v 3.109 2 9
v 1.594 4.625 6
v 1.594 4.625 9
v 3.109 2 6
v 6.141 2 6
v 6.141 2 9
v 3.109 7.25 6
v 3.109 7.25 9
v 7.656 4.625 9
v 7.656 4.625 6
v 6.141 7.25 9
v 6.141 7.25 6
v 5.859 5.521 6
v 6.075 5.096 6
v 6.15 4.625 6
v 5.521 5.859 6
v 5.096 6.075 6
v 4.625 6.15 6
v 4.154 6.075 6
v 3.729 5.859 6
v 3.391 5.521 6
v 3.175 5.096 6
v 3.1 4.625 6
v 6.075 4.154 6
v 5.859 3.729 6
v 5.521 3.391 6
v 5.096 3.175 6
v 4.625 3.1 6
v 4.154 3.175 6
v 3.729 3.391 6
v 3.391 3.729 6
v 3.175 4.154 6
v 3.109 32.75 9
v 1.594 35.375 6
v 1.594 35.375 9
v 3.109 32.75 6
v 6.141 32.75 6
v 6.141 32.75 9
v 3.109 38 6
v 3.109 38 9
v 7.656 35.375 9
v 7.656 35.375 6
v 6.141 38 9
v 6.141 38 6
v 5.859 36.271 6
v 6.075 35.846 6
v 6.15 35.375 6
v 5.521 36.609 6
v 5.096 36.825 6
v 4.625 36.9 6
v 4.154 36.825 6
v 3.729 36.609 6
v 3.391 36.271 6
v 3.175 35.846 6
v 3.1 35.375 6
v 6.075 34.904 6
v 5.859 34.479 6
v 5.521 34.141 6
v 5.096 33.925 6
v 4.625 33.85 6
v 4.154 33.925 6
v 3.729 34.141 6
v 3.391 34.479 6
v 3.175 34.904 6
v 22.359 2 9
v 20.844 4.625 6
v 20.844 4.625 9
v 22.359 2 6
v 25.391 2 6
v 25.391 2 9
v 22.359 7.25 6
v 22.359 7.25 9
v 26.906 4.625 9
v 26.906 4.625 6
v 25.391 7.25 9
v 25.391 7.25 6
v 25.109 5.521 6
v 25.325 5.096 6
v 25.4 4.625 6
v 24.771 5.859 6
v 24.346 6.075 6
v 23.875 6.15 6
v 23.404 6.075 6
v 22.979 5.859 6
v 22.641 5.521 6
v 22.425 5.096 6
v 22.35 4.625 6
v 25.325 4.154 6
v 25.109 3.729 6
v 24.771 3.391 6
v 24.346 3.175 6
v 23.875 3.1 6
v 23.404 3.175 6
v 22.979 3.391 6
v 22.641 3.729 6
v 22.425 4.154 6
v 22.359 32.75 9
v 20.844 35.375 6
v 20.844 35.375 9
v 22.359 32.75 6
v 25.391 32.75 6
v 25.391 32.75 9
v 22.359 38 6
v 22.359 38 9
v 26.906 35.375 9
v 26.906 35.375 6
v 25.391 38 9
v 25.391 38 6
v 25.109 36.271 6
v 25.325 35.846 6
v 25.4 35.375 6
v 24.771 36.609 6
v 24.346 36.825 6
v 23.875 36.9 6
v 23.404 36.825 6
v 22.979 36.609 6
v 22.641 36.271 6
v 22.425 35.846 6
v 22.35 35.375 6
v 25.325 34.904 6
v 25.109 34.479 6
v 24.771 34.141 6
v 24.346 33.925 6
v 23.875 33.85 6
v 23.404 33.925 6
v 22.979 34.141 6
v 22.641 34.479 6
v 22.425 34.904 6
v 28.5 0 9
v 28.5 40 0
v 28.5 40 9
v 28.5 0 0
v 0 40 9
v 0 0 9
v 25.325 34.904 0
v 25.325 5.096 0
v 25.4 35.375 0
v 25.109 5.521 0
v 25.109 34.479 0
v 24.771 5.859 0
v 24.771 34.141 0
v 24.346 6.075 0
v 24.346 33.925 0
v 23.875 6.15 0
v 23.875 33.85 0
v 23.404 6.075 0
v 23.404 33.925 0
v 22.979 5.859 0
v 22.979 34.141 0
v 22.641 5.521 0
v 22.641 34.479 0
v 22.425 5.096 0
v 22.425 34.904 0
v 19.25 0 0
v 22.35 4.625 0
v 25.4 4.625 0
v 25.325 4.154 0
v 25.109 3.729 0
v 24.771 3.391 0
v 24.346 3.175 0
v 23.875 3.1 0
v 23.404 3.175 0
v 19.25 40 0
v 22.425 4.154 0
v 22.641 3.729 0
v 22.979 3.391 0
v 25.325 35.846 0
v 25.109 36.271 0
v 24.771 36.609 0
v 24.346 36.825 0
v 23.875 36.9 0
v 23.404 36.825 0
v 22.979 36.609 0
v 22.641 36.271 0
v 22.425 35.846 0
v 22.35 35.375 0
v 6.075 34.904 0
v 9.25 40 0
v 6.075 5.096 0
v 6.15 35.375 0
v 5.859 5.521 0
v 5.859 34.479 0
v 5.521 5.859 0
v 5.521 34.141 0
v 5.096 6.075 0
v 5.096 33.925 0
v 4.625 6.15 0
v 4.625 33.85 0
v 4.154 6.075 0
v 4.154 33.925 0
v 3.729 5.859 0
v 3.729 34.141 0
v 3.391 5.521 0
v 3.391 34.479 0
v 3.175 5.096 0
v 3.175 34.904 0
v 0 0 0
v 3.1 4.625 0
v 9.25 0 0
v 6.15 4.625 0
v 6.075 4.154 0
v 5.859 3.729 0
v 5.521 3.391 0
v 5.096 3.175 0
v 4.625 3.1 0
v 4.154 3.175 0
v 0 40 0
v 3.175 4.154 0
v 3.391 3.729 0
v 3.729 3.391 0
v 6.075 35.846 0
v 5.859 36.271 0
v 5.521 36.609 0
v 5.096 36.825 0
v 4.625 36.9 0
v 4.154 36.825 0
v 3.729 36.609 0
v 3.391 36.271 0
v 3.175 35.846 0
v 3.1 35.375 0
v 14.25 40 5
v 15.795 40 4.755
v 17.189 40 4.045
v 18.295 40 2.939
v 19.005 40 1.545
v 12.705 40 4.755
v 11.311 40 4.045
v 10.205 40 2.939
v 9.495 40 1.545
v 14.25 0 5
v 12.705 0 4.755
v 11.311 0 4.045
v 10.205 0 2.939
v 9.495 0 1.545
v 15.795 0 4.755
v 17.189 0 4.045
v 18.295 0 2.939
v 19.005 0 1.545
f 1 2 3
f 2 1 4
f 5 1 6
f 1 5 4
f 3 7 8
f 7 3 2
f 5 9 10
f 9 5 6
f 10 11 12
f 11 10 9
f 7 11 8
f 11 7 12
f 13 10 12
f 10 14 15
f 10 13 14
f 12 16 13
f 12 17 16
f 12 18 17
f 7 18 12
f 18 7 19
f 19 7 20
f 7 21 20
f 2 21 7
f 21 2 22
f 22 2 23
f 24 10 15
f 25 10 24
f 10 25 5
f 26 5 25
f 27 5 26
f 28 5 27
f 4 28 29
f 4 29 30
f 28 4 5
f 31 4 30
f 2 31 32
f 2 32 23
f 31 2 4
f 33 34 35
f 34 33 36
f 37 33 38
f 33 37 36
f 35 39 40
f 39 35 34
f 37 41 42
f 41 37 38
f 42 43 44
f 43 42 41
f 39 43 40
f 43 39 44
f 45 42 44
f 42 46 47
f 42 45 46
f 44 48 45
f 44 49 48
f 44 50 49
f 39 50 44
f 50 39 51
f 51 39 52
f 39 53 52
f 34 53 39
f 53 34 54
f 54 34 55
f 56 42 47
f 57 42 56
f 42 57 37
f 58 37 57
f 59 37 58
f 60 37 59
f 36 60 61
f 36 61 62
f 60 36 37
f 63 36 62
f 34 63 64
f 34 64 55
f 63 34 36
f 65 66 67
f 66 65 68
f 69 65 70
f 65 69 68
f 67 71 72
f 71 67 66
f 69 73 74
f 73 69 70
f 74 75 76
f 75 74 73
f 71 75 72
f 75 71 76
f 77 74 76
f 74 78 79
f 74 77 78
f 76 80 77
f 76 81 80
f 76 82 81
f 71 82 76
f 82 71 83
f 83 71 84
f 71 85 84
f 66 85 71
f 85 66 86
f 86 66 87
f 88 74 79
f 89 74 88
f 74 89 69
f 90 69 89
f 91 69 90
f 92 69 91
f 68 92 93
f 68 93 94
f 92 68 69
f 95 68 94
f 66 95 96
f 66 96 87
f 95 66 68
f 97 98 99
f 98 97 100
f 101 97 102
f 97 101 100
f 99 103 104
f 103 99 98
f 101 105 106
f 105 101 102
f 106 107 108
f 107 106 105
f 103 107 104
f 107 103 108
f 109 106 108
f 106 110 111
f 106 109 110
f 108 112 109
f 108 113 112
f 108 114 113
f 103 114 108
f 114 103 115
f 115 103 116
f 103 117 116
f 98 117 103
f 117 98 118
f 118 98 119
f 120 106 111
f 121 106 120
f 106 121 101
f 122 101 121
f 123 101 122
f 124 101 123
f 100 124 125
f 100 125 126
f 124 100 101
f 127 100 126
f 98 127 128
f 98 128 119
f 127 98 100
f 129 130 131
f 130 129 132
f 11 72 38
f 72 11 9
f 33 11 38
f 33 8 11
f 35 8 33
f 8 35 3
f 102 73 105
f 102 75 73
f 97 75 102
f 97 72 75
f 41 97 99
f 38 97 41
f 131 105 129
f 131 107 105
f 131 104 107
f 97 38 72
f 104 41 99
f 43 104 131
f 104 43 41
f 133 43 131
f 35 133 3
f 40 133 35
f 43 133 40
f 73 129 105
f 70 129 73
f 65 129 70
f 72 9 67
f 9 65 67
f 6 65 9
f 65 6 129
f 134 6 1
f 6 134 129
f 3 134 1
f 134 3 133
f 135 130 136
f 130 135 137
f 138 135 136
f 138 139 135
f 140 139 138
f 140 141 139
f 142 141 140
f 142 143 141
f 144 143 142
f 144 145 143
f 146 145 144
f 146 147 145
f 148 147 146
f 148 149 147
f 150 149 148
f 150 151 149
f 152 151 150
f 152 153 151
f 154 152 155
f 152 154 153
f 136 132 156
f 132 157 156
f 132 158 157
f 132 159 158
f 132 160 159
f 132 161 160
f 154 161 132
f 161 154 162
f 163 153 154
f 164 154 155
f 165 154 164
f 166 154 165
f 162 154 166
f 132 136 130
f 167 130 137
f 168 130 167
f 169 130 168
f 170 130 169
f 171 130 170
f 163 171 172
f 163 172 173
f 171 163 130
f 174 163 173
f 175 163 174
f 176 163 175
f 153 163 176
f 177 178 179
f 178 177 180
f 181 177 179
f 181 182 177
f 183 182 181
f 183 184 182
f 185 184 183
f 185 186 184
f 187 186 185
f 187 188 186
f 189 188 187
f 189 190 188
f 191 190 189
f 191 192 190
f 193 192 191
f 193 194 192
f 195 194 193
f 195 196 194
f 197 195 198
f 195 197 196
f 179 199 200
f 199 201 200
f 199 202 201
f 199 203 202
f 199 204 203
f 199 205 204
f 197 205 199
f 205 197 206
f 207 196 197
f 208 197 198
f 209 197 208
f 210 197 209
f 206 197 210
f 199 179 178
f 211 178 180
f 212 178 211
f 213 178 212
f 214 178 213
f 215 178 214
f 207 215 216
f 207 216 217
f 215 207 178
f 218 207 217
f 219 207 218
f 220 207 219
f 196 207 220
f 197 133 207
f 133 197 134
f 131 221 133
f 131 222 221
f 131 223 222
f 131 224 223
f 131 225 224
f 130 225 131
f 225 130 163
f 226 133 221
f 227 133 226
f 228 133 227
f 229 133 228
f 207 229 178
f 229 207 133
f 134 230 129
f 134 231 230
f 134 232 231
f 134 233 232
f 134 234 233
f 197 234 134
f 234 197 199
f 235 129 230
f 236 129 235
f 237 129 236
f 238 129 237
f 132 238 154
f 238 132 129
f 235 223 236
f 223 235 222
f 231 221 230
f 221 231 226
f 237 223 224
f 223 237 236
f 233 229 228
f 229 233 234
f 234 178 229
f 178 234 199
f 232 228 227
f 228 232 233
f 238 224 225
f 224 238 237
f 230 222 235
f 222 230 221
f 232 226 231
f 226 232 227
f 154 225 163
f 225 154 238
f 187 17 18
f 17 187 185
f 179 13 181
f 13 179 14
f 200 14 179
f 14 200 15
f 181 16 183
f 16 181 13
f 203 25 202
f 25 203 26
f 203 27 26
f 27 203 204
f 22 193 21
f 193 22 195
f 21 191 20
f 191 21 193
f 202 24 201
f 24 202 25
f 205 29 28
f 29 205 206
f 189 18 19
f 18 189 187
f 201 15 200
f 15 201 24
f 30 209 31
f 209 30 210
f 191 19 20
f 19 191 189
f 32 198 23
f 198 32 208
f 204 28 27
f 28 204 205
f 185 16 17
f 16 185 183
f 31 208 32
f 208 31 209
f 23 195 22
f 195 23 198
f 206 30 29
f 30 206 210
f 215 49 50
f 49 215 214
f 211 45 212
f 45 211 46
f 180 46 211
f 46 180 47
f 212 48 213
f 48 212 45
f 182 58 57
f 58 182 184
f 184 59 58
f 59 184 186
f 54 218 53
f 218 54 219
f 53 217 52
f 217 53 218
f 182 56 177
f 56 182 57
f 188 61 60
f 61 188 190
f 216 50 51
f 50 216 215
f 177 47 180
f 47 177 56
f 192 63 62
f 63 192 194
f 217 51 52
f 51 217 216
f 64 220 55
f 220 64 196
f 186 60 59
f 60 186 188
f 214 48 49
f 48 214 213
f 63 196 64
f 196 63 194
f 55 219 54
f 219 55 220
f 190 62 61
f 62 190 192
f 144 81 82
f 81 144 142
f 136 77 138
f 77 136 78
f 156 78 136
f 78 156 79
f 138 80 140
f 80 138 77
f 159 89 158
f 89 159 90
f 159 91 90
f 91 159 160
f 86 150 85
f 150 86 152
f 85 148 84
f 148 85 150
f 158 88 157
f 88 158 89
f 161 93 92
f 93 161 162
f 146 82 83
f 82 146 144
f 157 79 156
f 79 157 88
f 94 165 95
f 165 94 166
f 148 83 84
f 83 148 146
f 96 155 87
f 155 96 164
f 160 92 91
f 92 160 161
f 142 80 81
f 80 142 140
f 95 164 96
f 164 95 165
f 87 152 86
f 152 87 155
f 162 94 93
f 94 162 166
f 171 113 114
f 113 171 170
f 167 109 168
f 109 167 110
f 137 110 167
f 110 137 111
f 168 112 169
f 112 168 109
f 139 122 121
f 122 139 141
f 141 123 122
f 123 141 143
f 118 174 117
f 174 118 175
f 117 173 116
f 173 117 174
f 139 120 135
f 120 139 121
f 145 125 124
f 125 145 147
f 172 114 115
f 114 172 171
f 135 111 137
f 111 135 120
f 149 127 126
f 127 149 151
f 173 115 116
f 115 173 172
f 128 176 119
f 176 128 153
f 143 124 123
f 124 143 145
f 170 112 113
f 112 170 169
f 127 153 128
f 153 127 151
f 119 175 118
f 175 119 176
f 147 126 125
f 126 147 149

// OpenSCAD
// file: bearing_dims.scad
/*
	bore = v[0];
	outer = v[1];
	len = v[2];
	ring_space = v[3];
	ring_dia = v[4];
	ring_gap = v[5];
*/

linear_bearing_dims = [
	[3,7,10,0,7,0],
	[4,8,12,0,8,0],
	[5,10,15,10.2,9.6,1.1],
	[6,12,19,13.5,11.5,1.1],
	[8,15,24,17.5,14.3,1.1],
	[10,19,29,22,18,1.3],
	[12,21,30,23,20,1.3],
	[13,23,32,23,22,1.3],
	[16,28,37,26.5,27,1.6],
	[20,32,42,30.5,30.5,1.6],
	[25,40,59,41,38,1.85],
	[30,45,64,44.5,43,1.85],
	[35,52,70,49.5,49,2.1],
	[40,60,80,60.5,57,2.1],
	[50,80,100,74,76.5,2.6],
	[60,90,110,85,86.5,3.15],
	[80,120,140,105.5,116,4.15],
	[100,150,150,125.5,145,4.15]
];

/*
	d = v[0];
	h = v[1];
	e = v[2];
	w = v[3];		// overall width
	l = v[4];		// overall length
	f = v[5];
	g = v[6];
	b = v[7];		// screw spacing along width
	c = v[8];		// screw spacing along length
	k = v[9];
	t = v[10];
	s1 = v[11];
	s2 = v[12];
	L1 = v[13];
*/

linear_bearing_block_dims = [
	[6,9,15,30,25,18,15,20,15,5,6,4,3.4,8],
	[8,11,17,34,30,22,18,24,18,5,6,4,3.4,8],
	[10,13,20,40,35,26,21,28,21,6,8,5,4.3,12],
	[12,15,21,42,36,28,24,30.5,26,5.75,8,5,4.3,12],
	[13,15,22,44,39,30,24.5,33,26,5.5,8,5,4.3,12],
	[16,19,25,50,44,38.5,32.5,36,34,7,9,5,4.3,12],
	[20,21,27,54,50,41,35,40,40,7,11,6,5.2,12],
	[25,26,38,76,67,51.5,42,54,50,11,12,8,7,18],
	[30,30,39,78,72,59.5,49,58,58,10,15,8,7,18],
	[35,34,45,90,80,68,54,70,60,10,18,8,7,18],
	[40,40,51,102,90,78,62,80,60,11,20,10,8.7,25],
	[50,52,61,122,110,102,80,100,80,11,25,10,8.7,25],
	[60,58,66,132,122,114,94,108,90,12,30,10,10.7,25]
];

linear_bearing_long_block_dims = [
	[8,11,17,34,59,22,18,24,42,5,6,4,3.4,8],
	[10,13,20,40,68,26,21,28,46,6,8,5,4.3,12],
	[12,15,21,42,70,28,24,30.5,50,5.75,8,5,4.3,12],
	[13,15,22,44,75,30,24.5,33,50,5.5,8,5,4.3,12],
	[16,19,25,50,85,38.5,32.5,36,60,7,9,5,4.3,12],
	[20,21,27,54,96,41,35,40,70,7,11,6,5.2,12],
	[25,26,38,76,130,51.5,42,54,100,11,12,8,7,18],
	[30,30,39,78,140,59.5,49,58,110,10,15,8,7,18],
	[35,34,45,90,155,68,54,70,120,10,18,8,7,18],
	[40,40,51,102,175,78,62,80,140,11,20,10,8.7,25],
];

/*
	d = v[0];
	D = v[1];
	L = v[2];
	D1 = v[3];
	H = v[4];
	pcd = v[5];
	d1 = v[6];
	d2 = v[7];
	h = v[8];
*/

linear_bearing_round_flange_dims = [
	[6,12,19,28,5,20,3.4,6.5,3.3],
	[8,15,24,32,5,24,3.4,6.5,3.3],
	[10,19,29,40,6,29,4.5,8,4.4],
	[12,21,30,42,6,32,4.5,8,4.4],
	[13,23,32,43,6,33,4.5,8,4.4],
	[16,28,37,48,6,38,4.5,8,4.4],
	[20,32,42,54,8,43,5.5,9.5,5.4],
	[25,40,59,62,8,51,5.5,9.5,5.4],
	[30,45,64,74,10,60,6.6,11,6.5],
	[35,52,70,82,10,67,6.6,11,6.5],
	[40,60,80,96,13,78,9,14,8.6],
	[50,80,100,116,13,98,9,14,8.6],
	[60,90,110,134,18,112,11,17.5,10.6]
];

function get_dims_for_shaft_size(shaft_size, dims) = 
	dims[search(shaft_size, dims, 1, 0)[0]];
// file: hex_nut.scad
module hex_nut(width, height, screw)
{
	w = width;
	w2 = width / 2;
	s = w2 / cos(30);
	h = w2 * tan(30);
	
	translate([-s/2, -w2, 0])
	difference()
	{
		linear_extrude(height=height)
			polygon([[0,0],[s,0],[s+h,w2],[s,w],[0,w],[-h,w2],[0,0]]);
		translate([s/2, w2, -0.1])
			cylinder(r = screw / 2, h = height+0.2, $fn=20);
	}
}

hex_nut(5.25, 2, 3);
// file: ShefRap_common.scad
include <bearing_dims.scad>;

base_t = 4;

screw_3mm = 3.05;
nut_3mm = 5.25;

clearance = 0.7;

/*
 * Rod sizes
 */

x_axis_rod = 10;
y_axis_rod = 10;
z_axis_rod = 12;

x_axis_bearing_dims = get_dims_for_shaft_size(x_axis_rod, linear_bearing_dims);
x_axis_bearing_dia = x_axis_bearing_dims[1];
x_axis_bearing_len = x_axis_bearing_dims[2];

y_axis_bearing_dims = get_dims_for_shaft_size(y_axis_rod, linear_bearing_block_dims);
y_axis_bearing_len = y_axis_bearing_dims[4];
y_axis_bearing_wid = y_axis_bearing_dims[3];
y_axis_bearing_mid_hgt = y_axis_bearing_dims[1];
y_axis_bearing_rod_clr = y_axis_bearing_mid_hgt - (y_axis_rod / 2);

x_axis_rod_separation = y_axis_bearing_len + (2 * (base_t + nut_3mm) + x_axis_rod);

echo(x_axis_rod_separation);

ex_hole_l = 46.785;
ex_hole_w = 24;
ex_hole_space = 6;


bb_support_t = 3.5;

function get_bb_dims(b_dia, b_len) = 
	[
		(b_len + 2 * bb_support_t) / 5,	// Individual bearing block width
		b_dia + (2 * bb_support_t),		// ... depth
		0.75 * b_dia,							// ... height
		(b_len + 2 * bb_support_t) / 5,	// ... and gap spacing between blocks
		(b_len + 2 * bb_support_t)			// Total bearing block length
	];
// main file
include <ShefRap_common.scad>;
use <hex_nut.scad>;

module rod_clamp(rod_dia, len, nuts=false, $fn=20)
{
	wid = rod_dia + (2 * (base_t + nut_3mm));
	ht = (rod_dia / 2) + base_t;

	screw_r = screw_3mm / 2;
	screw_h = ht + 0.2;
	screw_o = (base_t + nut_3mm) / 2;

	difference()
	{
		cube([wid, len, (rod_dia / 2) + base_t]);

		translate([wid / 2, -0.1, 0])
			rotate([-90,0,0])
				cylinder(r=rod_dia / 2, h=len + 0.2);

		translate([screw_o, screw_o, -0.1])
			cylinder(r=screw_r, h=screw_h);
		translate([screw_o, len - screw_o, -0.1])
			cylinder(r=screw_r, h=screw_h);
		translate([wid - screw_o, screw_o, -0.1])
			cylinder(r=screw_r, h=screw_h);
		translate([wid - screw_o, len - screw_o, -0.1])
			cylinder(r=screw_r, h=screw_h);

		if(nuts)
		{
			translate([screw_o, screw_o, ht - 3])
				hex_nut(nut_3mm, 3.1, 0);
			translate([screw_o, len - screw_o, ht - 3])
				hex_nut(nut_3mm, 3.1, 0);
			translate([wid - screw_o, screw_o, ht - 3])
				hex_nut(nut_3mm, 3.1, 0);
			translate([wid - screw_o, len - screw_o, ht - 3])
				hex_nut(nut_3mm, 3.1, 0);
		}
	}
}

rod_clamp(x_axis_rod, 40, nuts=true);
